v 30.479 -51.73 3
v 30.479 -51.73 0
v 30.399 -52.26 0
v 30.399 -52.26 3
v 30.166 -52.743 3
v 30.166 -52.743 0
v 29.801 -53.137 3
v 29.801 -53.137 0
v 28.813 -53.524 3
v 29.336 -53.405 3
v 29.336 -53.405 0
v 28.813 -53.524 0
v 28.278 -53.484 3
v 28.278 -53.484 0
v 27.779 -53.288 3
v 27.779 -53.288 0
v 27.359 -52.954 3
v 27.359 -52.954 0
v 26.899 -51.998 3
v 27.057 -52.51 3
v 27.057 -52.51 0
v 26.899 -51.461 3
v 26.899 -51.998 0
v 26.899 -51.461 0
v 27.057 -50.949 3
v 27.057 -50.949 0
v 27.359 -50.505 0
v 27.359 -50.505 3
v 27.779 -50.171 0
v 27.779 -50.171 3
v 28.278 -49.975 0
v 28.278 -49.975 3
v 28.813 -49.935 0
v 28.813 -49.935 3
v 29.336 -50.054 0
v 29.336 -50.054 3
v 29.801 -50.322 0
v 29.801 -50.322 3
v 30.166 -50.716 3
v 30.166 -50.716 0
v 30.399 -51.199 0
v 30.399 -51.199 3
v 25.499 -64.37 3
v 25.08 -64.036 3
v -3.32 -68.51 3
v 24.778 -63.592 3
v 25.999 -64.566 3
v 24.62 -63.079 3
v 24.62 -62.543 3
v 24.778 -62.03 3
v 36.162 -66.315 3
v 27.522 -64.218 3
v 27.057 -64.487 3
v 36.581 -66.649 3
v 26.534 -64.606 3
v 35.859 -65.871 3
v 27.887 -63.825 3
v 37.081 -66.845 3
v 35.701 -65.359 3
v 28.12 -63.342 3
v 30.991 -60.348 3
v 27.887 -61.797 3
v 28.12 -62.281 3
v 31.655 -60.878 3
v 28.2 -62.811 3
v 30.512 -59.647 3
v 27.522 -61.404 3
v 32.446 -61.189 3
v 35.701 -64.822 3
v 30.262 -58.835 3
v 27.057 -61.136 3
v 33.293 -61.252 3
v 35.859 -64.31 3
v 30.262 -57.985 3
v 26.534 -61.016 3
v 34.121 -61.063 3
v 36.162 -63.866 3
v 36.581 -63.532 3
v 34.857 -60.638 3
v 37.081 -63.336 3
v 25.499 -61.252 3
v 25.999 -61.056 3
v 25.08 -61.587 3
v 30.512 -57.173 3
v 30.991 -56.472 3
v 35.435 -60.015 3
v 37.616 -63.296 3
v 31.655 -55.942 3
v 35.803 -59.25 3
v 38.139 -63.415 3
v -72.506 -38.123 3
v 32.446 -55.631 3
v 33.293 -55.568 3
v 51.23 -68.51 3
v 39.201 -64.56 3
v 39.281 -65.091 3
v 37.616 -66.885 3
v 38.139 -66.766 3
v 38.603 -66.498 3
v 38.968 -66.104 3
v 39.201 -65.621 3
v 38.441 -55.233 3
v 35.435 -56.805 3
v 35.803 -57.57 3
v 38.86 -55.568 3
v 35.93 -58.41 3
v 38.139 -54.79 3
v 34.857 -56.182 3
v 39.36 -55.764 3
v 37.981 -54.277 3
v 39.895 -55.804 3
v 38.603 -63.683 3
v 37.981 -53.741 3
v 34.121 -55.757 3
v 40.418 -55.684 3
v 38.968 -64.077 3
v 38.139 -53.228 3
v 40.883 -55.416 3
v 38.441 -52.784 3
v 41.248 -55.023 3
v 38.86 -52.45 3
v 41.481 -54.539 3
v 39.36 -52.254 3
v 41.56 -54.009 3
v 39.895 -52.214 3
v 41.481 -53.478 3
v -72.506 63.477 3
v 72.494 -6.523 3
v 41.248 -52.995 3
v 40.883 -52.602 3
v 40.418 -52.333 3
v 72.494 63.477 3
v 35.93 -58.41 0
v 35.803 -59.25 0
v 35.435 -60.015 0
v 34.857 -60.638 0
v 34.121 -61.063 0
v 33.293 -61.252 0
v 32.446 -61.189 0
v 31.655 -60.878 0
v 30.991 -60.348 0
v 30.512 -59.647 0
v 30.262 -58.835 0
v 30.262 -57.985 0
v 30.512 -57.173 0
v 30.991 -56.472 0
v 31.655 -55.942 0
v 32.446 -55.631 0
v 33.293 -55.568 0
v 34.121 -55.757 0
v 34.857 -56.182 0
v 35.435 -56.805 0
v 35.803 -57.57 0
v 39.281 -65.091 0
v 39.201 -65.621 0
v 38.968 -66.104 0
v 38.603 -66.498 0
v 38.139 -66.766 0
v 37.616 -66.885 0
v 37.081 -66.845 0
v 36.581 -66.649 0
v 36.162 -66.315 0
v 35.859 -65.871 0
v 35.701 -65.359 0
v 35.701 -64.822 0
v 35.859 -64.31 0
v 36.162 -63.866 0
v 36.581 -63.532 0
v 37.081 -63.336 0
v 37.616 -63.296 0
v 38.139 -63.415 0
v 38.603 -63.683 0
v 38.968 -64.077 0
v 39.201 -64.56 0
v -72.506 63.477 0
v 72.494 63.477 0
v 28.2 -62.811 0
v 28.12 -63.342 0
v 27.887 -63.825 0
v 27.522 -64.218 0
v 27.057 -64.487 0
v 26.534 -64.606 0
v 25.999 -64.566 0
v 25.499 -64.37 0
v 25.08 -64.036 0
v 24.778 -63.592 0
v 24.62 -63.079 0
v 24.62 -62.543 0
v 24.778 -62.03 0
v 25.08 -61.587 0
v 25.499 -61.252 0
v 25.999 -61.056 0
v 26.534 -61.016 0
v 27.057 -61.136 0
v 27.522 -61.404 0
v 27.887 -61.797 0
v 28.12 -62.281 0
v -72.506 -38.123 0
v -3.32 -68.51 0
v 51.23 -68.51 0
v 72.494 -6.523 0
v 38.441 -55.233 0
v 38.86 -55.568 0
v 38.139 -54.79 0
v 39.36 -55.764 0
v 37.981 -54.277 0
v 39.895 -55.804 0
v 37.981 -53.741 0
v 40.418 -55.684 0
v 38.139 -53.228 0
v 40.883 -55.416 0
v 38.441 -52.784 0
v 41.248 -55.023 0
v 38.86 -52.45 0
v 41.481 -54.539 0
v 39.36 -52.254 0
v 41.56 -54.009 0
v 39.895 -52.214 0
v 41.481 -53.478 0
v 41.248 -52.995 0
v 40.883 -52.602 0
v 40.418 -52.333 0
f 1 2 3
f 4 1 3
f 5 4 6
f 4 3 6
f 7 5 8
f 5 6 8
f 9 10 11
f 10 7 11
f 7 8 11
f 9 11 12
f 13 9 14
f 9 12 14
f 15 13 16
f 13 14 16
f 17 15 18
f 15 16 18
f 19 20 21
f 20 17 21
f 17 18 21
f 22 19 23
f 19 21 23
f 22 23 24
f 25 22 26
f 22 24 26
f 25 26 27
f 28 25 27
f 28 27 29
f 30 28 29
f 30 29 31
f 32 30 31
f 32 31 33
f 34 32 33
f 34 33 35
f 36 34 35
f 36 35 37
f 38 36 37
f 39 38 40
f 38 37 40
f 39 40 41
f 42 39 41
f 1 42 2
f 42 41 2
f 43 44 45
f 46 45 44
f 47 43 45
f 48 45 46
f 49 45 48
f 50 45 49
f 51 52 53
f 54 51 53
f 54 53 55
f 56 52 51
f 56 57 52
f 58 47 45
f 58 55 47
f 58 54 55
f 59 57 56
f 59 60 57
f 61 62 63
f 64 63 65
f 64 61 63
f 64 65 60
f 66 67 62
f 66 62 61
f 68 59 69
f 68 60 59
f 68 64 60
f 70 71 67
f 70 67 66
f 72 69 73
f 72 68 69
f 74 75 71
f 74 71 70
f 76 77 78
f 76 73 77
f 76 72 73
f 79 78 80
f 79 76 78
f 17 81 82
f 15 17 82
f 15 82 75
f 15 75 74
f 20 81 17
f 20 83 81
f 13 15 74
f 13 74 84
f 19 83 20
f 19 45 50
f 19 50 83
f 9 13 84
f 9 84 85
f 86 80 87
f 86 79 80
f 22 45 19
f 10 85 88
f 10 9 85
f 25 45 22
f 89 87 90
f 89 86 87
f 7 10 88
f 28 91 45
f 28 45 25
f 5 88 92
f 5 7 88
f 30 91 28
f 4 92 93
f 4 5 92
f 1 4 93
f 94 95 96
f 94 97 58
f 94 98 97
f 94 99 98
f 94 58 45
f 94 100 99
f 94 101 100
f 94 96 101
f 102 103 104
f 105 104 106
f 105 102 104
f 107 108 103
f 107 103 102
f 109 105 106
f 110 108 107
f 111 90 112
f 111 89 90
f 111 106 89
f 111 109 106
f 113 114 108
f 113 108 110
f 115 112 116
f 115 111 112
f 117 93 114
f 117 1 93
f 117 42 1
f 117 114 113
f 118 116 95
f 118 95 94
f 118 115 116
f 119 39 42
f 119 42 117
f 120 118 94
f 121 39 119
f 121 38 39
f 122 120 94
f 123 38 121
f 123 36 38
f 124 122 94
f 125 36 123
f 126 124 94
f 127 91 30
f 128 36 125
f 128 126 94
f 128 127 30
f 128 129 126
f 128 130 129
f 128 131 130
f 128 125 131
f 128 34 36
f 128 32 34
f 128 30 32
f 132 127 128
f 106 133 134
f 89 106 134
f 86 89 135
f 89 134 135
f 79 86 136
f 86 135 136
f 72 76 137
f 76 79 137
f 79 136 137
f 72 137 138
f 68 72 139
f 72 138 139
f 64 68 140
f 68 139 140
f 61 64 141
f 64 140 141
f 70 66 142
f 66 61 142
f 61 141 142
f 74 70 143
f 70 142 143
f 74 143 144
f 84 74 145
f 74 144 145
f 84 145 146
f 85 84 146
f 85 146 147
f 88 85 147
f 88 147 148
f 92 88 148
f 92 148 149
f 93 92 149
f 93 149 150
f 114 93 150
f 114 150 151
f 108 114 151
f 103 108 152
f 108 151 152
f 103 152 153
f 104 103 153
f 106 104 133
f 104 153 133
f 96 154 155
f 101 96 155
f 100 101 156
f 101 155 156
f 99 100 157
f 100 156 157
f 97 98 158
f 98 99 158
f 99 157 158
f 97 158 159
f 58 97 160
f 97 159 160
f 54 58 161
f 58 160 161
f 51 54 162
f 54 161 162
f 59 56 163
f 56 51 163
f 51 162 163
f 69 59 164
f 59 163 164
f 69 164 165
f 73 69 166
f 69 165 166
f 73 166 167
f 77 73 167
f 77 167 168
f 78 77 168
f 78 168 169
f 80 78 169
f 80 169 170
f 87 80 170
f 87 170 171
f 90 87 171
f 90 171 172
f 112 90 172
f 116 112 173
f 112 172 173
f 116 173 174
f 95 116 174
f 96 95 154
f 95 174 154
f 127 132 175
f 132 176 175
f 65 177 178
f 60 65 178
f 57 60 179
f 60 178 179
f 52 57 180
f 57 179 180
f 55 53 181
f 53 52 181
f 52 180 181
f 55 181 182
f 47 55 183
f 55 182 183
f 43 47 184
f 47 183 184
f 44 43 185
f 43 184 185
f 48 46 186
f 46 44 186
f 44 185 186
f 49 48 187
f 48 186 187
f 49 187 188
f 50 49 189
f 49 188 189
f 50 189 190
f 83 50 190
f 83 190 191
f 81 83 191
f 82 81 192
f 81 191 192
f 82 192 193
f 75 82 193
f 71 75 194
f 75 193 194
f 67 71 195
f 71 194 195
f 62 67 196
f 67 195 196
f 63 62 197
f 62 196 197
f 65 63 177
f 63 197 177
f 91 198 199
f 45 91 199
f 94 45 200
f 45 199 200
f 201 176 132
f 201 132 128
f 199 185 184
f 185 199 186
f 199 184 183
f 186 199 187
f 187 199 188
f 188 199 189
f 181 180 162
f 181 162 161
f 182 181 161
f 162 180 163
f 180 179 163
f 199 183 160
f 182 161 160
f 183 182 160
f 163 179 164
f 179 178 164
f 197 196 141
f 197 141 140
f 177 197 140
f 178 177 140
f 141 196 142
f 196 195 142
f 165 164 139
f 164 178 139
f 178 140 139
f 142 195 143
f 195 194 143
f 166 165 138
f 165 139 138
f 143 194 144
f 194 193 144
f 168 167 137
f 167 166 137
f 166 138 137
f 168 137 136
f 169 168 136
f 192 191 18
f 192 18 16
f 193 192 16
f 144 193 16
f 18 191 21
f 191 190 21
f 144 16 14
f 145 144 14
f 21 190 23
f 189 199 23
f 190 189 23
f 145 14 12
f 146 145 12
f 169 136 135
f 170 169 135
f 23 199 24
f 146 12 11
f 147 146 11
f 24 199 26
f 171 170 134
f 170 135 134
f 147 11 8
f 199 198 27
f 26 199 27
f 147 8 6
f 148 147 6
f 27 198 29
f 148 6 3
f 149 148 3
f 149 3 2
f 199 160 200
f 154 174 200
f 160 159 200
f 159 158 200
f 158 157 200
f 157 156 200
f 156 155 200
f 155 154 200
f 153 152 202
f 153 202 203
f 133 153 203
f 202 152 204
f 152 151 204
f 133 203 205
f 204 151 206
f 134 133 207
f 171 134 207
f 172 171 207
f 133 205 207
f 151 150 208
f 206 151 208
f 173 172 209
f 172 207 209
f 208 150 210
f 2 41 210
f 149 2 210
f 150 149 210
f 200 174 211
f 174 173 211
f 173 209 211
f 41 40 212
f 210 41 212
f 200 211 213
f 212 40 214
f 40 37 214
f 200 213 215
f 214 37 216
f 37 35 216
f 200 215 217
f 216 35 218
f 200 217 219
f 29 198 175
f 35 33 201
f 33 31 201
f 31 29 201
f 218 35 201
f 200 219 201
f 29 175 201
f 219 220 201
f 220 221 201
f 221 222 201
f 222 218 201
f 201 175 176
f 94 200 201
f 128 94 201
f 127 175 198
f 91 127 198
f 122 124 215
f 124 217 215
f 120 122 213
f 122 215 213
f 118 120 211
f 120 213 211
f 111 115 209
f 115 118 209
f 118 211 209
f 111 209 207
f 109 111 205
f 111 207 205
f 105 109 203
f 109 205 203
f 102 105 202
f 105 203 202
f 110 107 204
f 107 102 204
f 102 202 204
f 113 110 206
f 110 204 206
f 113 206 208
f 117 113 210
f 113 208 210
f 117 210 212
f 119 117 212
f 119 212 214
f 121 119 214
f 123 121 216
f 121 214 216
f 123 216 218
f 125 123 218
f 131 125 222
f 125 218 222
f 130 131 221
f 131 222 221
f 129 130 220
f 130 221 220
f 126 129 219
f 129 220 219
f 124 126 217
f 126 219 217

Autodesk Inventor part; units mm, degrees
ref_plane "YZ Plane" through (0, 0, 0) normal (1, 0, 0) x (0, 1, 0)
ref_plane "XZ Plane" through (0, 0, 0) normal (0, 1, 0) x (-1, 0, 0)
ref_plane "XY Plane" through (0, 0, 0) normal (0, 0, 1) x (1, 0, 0)
sketch "Sketch1" plane through (0, 0, 0) normal (0, 0, 1) x (1, 0, 0)
  line L0 (72.4944, 63.4773) -> (-72.5056, 63.4773)
  line L1 (72.4944, 63.4773) -> (-72.5232, -63.5025) construction
  line L2 (-72.5056, 63.4773) -> (72.5218, -63.4915) construction
  circle A0 centre (33.08, -58.41) radius 2.85 projected
  line L3 (-72.5056, -38.1227) -> (-3.32, -68.51)
  line L4 (-72.5056, 63.4773) -> (-72.5056, -38.1227)
  line L5 (72.4944, 63.4773) -> (72.4944, -6.5227)
  line L6 (51.23, -68.51) -> (72.4944, -6.5227)
  line L7 (-3.32, -68.51) -> (51.23, -68.51)
  circle A1 centre (39.7605, -54.0088) radius 1.8 projected
  circle A2 centre (28.6788, -51.7295) radius 1.8 projected
  circle A3 centre (37.4812, -65.0905) radius 1.8 projected
  circle A4 centre (26.3995, -62.8112) radius 1.8 projected
  circle A5 centre (39.7605, -54.0088) radius 1.8 projected
  circle A6 centre (37.4812, -65.0905) radius 1.8 projected
  circle A7 centre (26.3995, -62.8112) radius 1.8 projected
  circle A8 centre (28.6788, -51.7295) radius 1.8 projected
  point P0 (0, 0)
  dimension "d6" = 145
  dimension "d9" = 70
extrude "Extrusion3" add sketch "Sketch1" along normal blind 3
properties part number "Bucket - door 2"
